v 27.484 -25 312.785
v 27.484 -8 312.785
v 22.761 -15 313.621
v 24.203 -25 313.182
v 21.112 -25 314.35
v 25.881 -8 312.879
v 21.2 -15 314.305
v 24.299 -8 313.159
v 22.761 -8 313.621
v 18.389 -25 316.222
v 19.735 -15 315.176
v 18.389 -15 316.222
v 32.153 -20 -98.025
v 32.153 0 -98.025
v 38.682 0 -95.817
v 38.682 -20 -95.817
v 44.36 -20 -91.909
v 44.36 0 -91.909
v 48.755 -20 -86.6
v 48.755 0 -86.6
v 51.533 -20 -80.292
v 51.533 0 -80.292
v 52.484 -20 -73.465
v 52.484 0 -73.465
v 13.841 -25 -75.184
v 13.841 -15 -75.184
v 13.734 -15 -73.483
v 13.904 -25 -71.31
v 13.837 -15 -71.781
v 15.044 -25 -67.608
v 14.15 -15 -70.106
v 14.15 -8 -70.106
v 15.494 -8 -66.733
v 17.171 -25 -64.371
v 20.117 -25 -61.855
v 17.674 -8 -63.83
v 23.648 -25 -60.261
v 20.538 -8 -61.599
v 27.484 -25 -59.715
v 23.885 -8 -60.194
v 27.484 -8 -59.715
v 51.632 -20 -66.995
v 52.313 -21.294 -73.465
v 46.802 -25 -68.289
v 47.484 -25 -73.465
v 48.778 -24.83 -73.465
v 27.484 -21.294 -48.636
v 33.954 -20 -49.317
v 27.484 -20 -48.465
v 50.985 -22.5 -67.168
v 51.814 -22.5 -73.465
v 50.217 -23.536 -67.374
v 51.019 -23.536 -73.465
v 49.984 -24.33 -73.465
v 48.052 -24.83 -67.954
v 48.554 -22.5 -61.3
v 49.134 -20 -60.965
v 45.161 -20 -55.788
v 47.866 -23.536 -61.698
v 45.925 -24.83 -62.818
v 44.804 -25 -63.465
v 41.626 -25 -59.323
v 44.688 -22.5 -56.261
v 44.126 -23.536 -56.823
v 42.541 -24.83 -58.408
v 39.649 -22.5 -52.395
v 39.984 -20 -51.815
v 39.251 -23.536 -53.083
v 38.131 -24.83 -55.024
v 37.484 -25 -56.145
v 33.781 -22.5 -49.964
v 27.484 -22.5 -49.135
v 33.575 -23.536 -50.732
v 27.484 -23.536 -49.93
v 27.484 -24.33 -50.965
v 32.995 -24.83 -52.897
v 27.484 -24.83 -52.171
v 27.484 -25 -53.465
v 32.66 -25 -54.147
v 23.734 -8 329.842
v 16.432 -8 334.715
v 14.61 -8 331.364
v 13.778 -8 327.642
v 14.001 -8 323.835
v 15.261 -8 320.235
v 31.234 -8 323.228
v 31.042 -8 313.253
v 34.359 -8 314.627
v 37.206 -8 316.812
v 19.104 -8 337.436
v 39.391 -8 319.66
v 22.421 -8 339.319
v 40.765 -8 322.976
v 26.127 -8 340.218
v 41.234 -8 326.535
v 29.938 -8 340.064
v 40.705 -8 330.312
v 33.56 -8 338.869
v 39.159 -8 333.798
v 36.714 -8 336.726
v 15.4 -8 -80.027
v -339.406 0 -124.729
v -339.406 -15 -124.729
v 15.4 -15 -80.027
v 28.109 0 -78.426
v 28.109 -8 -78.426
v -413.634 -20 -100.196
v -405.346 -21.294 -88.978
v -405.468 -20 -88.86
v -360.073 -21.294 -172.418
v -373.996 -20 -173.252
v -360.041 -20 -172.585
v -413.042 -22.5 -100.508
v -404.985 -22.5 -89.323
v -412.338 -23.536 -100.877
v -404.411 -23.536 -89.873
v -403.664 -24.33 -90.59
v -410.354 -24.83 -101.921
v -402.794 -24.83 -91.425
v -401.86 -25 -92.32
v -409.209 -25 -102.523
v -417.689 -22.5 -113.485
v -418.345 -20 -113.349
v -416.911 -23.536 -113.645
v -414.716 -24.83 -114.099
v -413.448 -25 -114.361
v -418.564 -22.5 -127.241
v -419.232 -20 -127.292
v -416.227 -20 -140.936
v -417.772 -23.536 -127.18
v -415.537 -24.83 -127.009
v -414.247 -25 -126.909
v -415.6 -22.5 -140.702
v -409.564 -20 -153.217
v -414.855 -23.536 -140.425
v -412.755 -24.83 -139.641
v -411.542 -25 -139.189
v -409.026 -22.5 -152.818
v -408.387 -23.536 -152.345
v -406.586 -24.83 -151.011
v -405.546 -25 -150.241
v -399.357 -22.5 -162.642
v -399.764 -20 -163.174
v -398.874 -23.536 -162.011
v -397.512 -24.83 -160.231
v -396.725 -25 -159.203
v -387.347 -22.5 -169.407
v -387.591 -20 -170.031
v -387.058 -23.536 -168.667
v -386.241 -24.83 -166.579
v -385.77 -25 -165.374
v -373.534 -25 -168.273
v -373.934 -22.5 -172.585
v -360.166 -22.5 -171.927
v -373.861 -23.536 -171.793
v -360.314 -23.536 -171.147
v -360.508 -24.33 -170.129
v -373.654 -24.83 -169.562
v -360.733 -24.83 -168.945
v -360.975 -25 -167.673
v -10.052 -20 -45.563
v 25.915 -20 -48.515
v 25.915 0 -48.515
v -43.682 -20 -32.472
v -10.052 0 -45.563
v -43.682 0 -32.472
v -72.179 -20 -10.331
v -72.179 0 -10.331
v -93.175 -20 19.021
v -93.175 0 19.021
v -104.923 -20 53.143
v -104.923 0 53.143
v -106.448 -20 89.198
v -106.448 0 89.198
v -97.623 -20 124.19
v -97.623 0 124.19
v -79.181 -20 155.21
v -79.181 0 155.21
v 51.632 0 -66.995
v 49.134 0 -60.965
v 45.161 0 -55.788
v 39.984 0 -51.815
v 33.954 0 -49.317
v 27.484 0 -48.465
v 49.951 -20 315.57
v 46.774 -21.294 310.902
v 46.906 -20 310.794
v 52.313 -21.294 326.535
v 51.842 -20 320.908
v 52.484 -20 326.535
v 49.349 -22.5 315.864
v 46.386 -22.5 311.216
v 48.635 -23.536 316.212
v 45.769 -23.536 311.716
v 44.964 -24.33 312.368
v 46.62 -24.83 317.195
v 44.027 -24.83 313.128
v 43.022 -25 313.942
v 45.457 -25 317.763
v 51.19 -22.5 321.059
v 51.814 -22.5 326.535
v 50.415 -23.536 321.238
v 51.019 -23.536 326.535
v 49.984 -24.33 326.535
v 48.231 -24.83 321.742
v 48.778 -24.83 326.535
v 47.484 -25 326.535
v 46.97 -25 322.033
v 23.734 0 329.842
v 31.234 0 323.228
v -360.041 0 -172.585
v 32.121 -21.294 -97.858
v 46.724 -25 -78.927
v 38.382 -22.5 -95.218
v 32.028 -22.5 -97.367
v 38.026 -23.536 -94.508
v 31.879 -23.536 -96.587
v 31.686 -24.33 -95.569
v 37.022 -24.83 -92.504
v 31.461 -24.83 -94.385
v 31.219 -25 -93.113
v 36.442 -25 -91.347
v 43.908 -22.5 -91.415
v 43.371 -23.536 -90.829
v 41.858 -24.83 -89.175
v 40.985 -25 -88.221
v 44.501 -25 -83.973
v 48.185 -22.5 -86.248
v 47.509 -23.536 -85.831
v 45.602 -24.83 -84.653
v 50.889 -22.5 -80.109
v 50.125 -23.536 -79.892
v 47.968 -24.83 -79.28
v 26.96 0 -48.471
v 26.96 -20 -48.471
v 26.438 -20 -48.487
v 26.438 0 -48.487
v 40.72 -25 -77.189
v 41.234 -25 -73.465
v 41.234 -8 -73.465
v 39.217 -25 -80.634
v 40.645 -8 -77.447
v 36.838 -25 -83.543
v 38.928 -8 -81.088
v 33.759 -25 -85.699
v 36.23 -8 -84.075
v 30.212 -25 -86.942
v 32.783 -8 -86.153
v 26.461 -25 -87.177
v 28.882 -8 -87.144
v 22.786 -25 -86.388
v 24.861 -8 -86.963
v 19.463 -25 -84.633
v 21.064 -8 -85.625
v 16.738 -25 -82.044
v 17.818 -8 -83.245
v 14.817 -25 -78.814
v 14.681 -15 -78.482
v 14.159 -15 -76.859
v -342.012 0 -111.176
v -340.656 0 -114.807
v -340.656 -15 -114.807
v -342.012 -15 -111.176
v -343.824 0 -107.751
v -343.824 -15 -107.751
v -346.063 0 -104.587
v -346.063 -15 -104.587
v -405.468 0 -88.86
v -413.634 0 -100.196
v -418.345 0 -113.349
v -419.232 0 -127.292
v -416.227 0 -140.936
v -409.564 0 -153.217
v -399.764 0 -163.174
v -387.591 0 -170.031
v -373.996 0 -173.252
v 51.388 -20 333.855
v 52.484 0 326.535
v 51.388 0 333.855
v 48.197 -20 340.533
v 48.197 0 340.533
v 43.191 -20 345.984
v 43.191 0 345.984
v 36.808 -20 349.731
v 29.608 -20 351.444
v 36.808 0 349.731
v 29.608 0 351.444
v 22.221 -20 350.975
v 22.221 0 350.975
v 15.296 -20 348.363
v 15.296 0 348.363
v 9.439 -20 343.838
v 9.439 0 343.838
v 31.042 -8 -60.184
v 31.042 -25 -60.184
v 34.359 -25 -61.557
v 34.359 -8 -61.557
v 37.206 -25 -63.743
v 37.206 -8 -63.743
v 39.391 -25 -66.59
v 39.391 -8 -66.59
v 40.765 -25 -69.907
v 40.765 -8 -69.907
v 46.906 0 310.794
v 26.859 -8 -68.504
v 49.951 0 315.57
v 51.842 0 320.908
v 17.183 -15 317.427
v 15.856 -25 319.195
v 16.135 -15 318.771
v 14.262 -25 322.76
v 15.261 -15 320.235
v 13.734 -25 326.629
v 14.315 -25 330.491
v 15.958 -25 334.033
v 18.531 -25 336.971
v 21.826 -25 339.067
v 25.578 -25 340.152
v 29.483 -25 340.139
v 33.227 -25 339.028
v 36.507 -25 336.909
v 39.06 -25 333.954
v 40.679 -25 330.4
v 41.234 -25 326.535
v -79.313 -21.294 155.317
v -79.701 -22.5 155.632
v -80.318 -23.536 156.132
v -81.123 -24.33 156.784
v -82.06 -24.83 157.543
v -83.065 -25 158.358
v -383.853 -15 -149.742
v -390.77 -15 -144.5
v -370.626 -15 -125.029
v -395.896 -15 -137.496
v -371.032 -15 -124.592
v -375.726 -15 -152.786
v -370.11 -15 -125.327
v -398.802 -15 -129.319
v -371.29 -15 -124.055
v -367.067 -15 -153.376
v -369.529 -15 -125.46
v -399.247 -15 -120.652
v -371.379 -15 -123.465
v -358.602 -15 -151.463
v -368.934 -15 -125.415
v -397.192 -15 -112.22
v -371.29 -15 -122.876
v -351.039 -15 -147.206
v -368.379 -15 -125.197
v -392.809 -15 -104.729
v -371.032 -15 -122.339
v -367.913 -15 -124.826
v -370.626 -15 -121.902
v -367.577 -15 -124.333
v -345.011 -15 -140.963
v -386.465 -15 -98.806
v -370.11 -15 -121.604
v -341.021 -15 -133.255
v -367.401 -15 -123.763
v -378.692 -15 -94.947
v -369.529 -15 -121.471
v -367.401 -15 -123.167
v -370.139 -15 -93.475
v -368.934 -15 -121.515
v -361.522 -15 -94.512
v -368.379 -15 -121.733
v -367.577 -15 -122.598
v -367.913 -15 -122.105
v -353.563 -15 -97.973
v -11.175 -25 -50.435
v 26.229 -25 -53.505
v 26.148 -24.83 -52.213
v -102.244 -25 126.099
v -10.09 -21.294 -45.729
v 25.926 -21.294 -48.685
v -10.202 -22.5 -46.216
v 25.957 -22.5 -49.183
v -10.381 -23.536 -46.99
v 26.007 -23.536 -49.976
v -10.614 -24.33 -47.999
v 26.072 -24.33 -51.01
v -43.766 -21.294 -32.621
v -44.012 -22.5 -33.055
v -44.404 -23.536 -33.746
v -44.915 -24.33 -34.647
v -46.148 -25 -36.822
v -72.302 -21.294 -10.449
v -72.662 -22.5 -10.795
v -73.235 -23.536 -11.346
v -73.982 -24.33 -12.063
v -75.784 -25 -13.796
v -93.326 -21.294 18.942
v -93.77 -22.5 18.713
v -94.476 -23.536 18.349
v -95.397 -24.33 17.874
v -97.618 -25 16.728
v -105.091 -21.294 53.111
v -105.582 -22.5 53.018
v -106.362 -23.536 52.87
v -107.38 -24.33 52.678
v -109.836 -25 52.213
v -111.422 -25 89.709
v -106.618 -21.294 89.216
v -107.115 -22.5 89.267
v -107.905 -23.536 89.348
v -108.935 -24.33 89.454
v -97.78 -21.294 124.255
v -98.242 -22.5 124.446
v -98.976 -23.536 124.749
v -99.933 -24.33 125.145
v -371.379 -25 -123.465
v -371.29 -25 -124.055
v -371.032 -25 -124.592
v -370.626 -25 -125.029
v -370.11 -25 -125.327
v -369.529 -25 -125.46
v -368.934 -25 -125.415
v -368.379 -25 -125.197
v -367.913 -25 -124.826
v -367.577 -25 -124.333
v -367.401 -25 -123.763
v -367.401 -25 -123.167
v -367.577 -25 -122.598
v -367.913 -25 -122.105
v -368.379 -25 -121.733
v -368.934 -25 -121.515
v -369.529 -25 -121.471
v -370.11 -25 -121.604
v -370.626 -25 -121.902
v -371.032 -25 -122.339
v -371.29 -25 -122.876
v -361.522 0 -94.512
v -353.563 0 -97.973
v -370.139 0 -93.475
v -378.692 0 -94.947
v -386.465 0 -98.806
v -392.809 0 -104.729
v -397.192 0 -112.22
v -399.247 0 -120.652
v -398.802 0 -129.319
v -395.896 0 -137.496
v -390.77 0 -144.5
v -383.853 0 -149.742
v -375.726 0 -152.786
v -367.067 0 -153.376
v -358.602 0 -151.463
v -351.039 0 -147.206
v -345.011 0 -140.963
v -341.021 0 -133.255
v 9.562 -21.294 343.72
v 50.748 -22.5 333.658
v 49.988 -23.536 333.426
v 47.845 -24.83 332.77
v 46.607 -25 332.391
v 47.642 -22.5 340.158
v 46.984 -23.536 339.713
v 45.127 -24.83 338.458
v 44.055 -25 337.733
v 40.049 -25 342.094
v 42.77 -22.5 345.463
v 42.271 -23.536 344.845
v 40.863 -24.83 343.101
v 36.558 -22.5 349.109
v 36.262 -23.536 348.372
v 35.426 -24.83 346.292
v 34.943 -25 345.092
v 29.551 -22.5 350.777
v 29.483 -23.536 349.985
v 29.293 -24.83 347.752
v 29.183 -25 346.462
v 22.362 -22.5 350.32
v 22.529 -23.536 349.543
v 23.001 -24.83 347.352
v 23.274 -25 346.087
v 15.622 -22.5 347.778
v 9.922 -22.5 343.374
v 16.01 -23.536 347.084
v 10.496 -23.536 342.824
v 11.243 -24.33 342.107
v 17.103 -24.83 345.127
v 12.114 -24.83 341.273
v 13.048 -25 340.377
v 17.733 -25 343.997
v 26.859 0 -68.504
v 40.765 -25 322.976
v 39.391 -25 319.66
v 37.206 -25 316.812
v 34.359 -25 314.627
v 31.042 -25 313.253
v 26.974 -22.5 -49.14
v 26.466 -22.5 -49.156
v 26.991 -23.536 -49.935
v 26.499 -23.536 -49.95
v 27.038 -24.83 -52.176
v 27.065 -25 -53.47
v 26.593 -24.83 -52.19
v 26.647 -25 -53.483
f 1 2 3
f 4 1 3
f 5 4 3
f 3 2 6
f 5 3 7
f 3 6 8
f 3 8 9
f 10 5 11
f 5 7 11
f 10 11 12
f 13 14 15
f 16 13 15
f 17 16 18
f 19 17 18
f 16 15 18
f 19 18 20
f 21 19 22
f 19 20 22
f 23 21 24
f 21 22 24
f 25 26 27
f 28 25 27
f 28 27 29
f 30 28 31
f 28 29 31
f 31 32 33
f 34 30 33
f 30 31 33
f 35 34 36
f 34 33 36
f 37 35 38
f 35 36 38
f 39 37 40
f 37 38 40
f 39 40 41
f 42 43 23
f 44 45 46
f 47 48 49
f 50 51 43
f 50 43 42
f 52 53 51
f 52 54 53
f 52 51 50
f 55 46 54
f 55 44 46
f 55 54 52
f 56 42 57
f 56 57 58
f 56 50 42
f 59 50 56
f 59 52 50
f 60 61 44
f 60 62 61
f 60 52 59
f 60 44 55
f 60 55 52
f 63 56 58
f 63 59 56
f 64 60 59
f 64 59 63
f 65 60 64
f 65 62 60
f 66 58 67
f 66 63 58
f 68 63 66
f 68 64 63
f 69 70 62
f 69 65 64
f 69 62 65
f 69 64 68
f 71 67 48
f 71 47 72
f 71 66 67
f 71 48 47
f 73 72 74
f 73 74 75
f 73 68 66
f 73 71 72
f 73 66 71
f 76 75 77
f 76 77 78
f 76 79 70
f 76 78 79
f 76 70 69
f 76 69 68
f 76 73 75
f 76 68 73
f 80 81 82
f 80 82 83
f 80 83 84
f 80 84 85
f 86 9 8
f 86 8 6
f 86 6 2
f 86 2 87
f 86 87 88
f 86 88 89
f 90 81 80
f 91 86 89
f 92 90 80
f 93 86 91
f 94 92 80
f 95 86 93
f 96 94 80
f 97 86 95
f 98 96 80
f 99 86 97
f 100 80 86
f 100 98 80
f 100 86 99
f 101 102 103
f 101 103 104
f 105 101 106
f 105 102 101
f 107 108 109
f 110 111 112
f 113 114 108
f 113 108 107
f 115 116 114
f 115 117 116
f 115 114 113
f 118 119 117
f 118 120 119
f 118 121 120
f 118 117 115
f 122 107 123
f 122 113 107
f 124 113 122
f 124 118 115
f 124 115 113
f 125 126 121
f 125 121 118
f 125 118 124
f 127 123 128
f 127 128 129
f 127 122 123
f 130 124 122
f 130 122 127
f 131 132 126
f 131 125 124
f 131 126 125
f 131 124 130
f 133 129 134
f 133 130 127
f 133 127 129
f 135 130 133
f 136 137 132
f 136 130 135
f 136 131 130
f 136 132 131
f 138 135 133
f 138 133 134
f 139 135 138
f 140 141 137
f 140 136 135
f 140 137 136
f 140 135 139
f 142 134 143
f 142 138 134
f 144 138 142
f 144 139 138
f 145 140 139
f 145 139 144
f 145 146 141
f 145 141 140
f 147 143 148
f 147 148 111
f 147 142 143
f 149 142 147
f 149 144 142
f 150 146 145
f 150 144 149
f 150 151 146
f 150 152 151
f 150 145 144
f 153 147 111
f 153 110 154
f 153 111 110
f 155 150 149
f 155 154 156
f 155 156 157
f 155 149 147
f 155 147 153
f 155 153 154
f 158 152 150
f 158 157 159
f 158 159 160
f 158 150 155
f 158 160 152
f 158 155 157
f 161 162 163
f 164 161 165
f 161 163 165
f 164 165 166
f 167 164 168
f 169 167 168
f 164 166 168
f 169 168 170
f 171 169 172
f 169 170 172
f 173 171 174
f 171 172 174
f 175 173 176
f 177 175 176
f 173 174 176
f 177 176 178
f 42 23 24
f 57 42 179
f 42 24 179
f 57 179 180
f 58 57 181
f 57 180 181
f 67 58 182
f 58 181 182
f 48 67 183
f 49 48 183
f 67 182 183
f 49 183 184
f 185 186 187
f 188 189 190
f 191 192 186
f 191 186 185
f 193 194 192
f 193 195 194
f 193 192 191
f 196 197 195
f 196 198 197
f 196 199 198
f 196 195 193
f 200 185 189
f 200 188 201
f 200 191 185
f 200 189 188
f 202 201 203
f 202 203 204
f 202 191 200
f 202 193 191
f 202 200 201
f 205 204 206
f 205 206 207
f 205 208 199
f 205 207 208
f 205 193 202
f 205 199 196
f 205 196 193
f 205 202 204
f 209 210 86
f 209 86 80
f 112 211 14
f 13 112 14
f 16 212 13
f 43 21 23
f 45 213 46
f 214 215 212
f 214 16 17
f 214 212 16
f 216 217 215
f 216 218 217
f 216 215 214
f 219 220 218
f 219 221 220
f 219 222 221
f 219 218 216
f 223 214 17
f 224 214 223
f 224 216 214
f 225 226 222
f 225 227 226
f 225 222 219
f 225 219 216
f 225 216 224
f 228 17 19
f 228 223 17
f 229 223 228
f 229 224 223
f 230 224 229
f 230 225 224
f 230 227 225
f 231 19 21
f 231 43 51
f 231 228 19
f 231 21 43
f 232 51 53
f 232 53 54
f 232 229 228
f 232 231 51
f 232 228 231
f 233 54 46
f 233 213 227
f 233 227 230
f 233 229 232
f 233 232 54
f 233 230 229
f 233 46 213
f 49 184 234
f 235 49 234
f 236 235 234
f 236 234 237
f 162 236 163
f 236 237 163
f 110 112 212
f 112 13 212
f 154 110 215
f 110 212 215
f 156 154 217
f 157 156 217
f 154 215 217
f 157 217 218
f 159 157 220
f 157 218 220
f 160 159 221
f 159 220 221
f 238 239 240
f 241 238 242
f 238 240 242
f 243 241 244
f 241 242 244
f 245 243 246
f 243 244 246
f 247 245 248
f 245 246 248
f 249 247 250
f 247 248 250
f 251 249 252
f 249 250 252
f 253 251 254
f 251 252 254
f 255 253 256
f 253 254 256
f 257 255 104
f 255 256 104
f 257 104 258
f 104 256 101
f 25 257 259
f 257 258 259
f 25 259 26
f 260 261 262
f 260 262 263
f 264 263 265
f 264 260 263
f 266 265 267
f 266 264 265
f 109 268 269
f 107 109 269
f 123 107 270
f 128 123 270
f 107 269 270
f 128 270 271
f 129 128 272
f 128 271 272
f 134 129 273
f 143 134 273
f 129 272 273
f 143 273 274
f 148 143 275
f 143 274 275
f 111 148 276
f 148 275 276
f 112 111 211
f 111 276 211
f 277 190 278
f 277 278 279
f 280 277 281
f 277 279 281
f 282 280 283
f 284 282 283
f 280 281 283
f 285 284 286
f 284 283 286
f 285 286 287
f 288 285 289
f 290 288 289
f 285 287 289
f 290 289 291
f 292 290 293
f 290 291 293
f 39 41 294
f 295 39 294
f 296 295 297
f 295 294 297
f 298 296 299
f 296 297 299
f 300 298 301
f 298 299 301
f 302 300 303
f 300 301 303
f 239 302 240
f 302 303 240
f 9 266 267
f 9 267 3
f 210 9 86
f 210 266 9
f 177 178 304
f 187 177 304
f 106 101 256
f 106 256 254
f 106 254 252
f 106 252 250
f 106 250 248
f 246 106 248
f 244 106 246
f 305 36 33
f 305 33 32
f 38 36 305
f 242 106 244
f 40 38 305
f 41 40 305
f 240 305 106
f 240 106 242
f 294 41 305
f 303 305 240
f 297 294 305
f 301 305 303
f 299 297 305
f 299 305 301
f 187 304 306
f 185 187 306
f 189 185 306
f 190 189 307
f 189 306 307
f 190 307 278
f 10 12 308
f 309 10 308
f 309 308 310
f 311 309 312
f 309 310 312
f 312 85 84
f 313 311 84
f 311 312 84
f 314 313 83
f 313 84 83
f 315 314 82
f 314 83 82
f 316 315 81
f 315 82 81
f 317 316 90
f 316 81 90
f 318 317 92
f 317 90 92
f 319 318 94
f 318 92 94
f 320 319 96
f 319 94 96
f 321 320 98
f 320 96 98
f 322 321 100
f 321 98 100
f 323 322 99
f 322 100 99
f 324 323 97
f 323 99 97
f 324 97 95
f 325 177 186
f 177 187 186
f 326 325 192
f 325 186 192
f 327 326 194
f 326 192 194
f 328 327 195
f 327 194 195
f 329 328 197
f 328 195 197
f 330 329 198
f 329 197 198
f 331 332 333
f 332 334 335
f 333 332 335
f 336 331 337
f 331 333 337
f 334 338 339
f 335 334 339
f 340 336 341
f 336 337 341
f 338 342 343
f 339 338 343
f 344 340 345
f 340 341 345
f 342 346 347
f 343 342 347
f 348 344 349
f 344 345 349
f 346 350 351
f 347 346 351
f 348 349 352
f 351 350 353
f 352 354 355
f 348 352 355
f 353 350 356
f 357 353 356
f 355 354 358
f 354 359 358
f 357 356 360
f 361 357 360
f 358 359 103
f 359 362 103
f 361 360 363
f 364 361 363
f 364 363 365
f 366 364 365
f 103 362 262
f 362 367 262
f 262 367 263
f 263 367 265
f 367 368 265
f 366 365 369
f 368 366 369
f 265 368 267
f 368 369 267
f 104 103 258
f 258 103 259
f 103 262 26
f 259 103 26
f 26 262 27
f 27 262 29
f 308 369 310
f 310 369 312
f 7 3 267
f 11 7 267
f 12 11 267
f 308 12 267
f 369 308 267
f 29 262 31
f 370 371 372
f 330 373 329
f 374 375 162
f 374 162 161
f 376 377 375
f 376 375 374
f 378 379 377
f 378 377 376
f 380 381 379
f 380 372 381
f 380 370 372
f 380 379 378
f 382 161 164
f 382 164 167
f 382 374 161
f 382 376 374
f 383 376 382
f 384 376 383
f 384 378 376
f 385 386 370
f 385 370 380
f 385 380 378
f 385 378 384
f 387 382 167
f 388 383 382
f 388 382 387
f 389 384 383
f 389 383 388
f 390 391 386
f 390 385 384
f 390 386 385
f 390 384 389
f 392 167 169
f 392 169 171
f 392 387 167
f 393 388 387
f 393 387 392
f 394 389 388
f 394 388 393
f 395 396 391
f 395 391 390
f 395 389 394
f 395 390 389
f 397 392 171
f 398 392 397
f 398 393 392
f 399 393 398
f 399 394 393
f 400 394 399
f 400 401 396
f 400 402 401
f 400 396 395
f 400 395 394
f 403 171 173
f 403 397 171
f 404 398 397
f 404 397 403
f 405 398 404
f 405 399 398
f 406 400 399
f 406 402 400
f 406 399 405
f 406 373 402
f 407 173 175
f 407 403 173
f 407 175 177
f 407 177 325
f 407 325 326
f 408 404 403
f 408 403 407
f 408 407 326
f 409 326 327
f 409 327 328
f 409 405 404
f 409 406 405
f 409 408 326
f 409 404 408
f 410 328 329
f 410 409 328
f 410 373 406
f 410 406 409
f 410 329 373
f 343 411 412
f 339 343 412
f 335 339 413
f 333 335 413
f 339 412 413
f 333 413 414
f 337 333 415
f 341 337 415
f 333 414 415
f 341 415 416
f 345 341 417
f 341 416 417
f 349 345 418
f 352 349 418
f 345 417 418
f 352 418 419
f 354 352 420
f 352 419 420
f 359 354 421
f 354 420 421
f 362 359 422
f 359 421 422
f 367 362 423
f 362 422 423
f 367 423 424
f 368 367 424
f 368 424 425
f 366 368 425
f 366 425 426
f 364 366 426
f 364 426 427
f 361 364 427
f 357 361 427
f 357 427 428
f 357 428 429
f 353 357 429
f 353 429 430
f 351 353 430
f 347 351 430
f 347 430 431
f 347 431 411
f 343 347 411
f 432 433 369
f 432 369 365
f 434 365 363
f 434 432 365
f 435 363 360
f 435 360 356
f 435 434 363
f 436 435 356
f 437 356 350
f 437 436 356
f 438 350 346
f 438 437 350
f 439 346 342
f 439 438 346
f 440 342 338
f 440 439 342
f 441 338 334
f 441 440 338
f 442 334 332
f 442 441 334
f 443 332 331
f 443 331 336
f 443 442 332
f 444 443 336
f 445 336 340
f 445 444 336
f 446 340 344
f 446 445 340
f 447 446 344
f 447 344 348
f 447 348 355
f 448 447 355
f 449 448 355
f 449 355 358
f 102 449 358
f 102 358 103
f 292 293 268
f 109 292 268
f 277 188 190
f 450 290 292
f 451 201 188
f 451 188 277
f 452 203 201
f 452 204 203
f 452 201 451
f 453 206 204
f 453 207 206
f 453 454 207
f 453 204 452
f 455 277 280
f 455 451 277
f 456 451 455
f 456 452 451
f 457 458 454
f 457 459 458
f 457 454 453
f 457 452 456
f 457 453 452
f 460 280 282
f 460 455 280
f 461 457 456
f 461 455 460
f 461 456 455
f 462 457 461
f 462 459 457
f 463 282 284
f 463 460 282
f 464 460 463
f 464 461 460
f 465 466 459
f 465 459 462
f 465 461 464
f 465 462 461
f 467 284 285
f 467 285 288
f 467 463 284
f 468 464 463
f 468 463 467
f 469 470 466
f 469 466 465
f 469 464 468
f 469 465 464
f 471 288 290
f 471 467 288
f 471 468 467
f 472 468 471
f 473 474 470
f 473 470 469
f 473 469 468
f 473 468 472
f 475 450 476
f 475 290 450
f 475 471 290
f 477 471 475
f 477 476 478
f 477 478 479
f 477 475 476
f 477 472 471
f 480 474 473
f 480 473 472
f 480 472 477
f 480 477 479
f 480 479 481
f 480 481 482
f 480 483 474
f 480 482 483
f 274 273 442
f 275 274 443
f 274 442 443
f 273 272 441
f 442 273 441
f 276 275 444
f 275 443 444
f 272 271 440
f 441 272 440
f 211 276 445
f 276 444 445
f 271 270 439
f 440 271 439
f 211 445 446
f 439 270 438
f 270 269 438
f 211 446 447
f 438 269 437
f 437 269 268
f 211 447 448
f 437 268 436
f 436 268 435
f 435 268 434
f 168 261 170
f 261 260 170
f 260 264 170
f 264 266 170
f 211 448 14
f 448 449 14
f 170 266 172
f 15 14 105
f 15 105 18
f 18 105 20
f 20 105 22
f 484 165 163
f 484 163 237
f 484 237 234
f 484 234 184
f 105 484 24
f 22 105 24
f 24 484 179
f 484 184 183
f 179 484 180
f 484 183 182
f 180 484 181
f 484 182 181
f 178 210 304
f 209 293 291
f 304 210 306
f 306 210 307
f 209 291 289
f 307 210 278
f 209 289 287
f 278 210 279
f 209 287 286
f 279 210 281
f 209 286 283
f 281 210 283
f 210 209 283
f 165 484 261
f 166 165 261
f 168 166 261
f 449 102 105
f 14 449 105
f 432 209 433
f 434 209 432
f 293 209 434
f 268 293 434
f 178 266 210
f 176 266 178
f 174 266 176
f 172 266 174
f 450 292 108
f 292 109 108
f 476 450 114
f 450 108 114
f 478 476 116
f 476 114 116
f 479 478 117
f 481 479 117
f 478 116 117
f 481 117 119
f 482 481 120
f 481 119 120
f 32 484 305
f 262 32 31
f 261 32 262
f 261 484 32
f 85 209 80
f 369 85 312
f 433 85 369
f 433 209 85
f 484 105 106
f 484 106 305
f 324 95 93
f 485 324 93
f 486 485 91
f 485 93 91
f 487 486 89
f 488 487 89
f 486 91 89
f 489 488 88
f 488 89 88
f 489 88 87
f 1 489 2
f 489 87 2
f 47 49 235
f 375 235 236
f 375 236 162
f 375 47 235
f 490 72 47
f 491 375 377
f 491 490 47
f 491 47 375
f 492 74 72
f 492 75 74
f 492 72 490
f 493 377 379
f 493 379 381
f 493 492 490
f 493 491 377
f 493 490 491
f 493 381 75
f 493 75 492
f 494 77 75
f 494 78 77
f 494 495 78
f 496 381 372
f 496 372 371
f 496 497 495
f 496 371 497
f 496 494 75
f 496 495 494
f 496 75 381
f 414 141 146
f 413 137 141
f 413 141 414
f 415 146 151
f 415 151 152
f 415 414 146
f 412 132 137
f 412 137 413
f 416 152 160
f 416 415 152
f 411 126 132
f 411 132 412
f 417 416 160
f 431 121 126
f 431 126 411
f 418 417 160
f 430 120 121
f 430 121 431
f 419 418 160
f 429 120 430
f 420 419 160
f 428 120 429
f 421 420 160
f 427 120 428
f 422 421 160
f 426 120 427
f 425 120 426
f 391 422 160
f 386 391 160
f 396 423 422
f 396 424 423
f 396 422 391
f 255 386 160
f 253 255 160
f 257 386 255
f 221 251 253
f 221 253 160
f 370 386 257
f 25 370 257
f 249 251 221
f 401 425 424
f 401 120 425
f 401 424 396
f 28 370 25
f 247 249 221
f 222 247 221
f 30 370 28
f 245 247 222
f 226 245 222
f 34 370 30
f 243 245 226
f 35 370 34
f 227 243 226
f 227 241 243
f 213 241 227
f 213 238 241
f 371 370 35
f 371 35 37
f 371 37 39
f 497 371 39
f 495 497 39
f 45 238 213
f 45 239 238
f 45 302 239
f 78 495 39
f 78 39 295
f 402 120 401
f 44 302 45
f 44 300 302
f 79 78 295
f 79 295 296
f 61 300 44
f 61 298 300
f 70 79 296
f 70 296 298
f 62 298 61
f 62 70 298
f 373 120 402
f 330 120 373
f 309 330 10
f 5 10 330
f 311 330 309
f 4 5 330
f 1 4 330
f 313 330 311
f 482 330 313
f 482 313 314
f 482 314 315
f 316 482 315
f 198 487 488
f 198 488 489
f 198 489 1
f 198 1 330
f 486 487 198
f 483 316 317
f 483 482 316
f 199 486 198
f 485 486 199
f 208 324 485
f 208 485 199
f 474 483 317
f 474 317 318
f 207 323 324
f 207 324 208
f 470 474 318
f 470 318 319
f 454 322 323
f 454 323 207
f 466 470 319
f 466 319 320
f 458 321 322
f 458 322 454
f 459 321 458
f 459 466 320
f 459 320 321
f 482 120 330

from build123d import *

# Parameters (mm, degrees)
F1_DEPTH = 25
F2_DEPTH = 8
F3_DEPTH = 25
F4_DEPTH = 15
F6_DEPTH = 15
F7_D     = 4
F8_R     = 5


with BuildPart() as f1:
    # F0 (on Front) → F1 (new body)
    with BuildSketch(Plane.XZ):
        with BuildLine():
            Line((-349.5359115523, -100.9652705431), (-336.307154997, -85.9652705431))
            ThreePointArc((-336.307154997, -85.9652705431), (-353.178144257, -76.1627254717), (-372.5163375921, -73.5637935721))
            ThreePointArc((-372.5163375921, -73.5637935721), (-390.430756518, -78.1130324452), (-405.4684846867, -88.8595998648))
            ThreePointArc((-405.4684846867, -88.8595998648), (-413.3268873379, -147.310338704), (-360.0407755432, -172.5854975141))
            ThreePointArc((-360.0407755432, -172.5854975141), (-343.7235260202, -166.3814012494), (-330.5336171349, -154.9459412214))
            ThreePointArc((-330.5336171349, -154.9459412214), (-322.250119692, -140.1645001283), (-319.3790463853, -123.4652705431))
            ThreePointArc((-319.3790463853, -123.4652705431), (-319.4771834235, -120.3341249159), (-319.7712093028, -117.2152705431))
            Line((-319.7712093028, -117.2152705431), (-339.6143441358, -119.7152705431))
            ThreePointArc((-339.6143441358, -119.7152705431), (-339.4379286082, -121.5865831668), (-339.3790463853, -123.4652705431))
            ThreePointArc((-339.3790463853, -123.4652705431), (-396.7221812183, -135.8084053761), (-349.5359115523, -100.9652705431))
        make_face()
        with BuildLine():
            ThreePointArc((-319.7712093028, -117.2152705431), (-325.1848725611, -100.0799118758), (-336.307154997, -85.9652705431))
            Line((-336.307154997, -85.9652705431), (-349.5359115523, -100.9652705431))
            ThreePointArc((-349.5359115523, -100.9652705431), (-342.8625420908, -109.4340553427), (-339.6143441358, -119.7152705431))
            Line((-339.6143441358, -119.7152705431), (-319.7712093028, -117.2152705431))
        make_face()
        with BuildLine():
            Line((-336.307154997, -85.9652705431), (-322.6025679954, -70.4257295315))
            Line((-322.6025679954, -70.4257295315), (-372.5163375921, -73.5637935721))
            ThreePointArc((-372.5163375921, -73.5637935721), (-353.178144257, -76.1627254717), (-336.307154997, -85.9652705431))
        make_face()
        with BuildLine():
            Line((-322.6025679954, -70.4257295315), (10.9477045802, 307.7847294569))
            ThreePointArc((10.9477045802, 307.7847294569), (2.5055132487, 325.4894205434), (9.4389311237, 343.837564796))
            Line((9.4389311237, 343.837564796), (-405.4684846867, -88.8595998648))
            ThreePointArc((-405.4684846867, -88.8595998648), (-390.430756518, -78.1130324452), (-372.5163375921, -73.5637935721))
            Line((-372.5163375921, -73.5637935721), (-322.6025679954, -70.4257295315))
        make_face()
        with BuildLine():
            ThreePointArc((27.4836502744, 301.5347294569), (18.6448155096, 303.1493707896), (10.9477045802, 307.7847294569))
            Line((10.9477045802, 307.7847294569), (-322.6025679954, -70.4257295315))
            Line((-322.6025679954, -70.4257295315), (-258.7862584205, -66.4136168841))
            Line((-258.7862584205, -66.4136168841), (-79.1806184856, 155.209939055))
            Line((-79.1806184856, 155.209939055), (27.4836502744, 286.8278244556))
            Line((27.4836502744, 286.8278244556), (27.4836502744, 301.5347294569))
        make_face()
        with BuildLine():
            Line((-258.7862584205, -66.4136168841), (-322.6025679954, -70.4257295315))
            Line((-322.6025679954, -70.4257295315), (-336.307154997, -85.9652705431))
            ThreePointArc((-336.307154997, -85.9652705431), (-325.1848725611, -100.0799118758), (-319.7712093028, -117.2152705431))
            Line((-319.7712093028, -117.2152705431), (-297.7031676779, -114.4349586354))
            Line((-297.7031676779, -114.4349586354), (-258.7862584205, -66.4136168841))
        make_face()
        with BuildLine():
            Line((-79.1806184856, 155.209939055), (-258.7862584205, -66.4136168841))
            Line((-258.7862584205, -66.4136168841), (25.915004671, -48.5145320576))
            ThreePointArc((25.915004671, -48.5145320576), (-93.174775765, 19.0206064889), (-79.1806184856, 155.209939055))
        make_face()
        with BuildLine():
            Line((13.8414950767, -75.1840205431), (2.6797317332, -76.5902705431))
            ThreePointArc((2.6797317332, -76.5902705431), (12.7792837339, -93.6836187606), (32.1527856955, -98.0253840286))
            ThreePointArc((32.1527856955, -98.0253840286), (46.7414848558, -89.4069080762), (52.4836502744, -73.4652705431))
            ThreePointArc((52.4836502744, -73.4652705431), (45.1613198041, -55.7876010134), (27.4836502744, -48.4652705431))
            Line((27.4836502744, -48.4652705431), (27.4836502744, -59.7152705431))
            ThreePointArc((27.4836502744, -59.7152705431), (37.2063685157, -63.7425523018), (41.2336502744, -73.4652705431))
            ThreePointArc((41.2336502744, -73.4652705431), (28.3447153219, -87.1882828576), (13.8414950767, -75.1840205431))
        make_face()
        with BuildLine():
            Line((2.6797317332, -76.5902705431), (-297.7031676779, -114.4349586354))
            Line((-297.7031676779, -114.4349586354), (-330.5336171349, -154.9459412214))
            ThreePointArc((-330.5336171349, -154.9459412214), (-343.7235260202, -166.3814012494), (-360.0407755432, -172.5854975141))
            Line((-360.0407755432, -172.5854975141), (32.1527856955, -98.0253840286))
            ThreePointArc((32.1527856955, -98.0253840286), (12.7792837339, -93.6836187606), (2.6797317332, -76.5902705431))
        make_face()
        with BuildLine():
            ThreePointArc((27.4836502744, -48.4652705431), (26.6989408177, -48.4775889566), (25.915004671, -48.5145320576))
            ThreePointArc((25.915004671, -48.5145320576), (8.223852566, -57.5260048062), (2.6797317332, -76.5902705431))
            Line((2.6797317332, -76.5902705431), (13.8414950767, -75.1840205431))
            ThreePointArc((13.8414950767, -75.1840205431), (17.1711502744, -64.3705004113), (27.4836502744, -59.7152705431))
            Line((27.4836502744, -59.7152705431), (27.4836502744, -48.4652705431))
        make_face()
        with BuildLine():
            Line((25.915004671, -48.5145320576), (-258.7862584205, -66.4136168841))
            Line((-258.7862584205, -66.4136168841), (-297.7031676779, -114.4349586354))
            Line((-297.7031676779, -114.4349586354), (2.6797317332, -76.5902705431))
            ThreePointArc((2.6797317332, -76.5902705431), (8.223852566, -57.5260048062), (25.915004671, -48.5145320576))
        make_face()
        with BuildLine():
            Line((-297.7031676779, -114.4349586354), (-319.7712093028, -117.2152705431))
            ThreePointArc((-319.7712093028, -117.2152705431), (-319.4771834235, -120.3341249159), (-319.3790463853, -123.4652705431))
            ThreePointArc((-319.3790463853, -123.4652705431), (-322.250119692, -140.1645001283), (-330.5336171349, -154.9459412214))
            Line((-330.5336171349, -154.9459412214), (-297.7031676779, -114.4349586354))
        make_face()
        with BuildLine():
            ThreePointArc((46.9063648996, 310.7943941178), (38.2421728617, 303.9680683893), (27.4836502744, 301.5347294569))
            Line((27.4836502744, 301.5347294569), (27.4836502744, 286.8278244556))
            Line((27.4836502744, 286.8278244556), (46.9063648996, 310.7943941178))
        make_face()
        with BuildLine():
            Line((10.9477045802, 307.7847294569), (18.3888801426, 316.2222294569))
            ThreePointArc((18.3888801426, 316.2222294569), (21.8263801426, 339.0669995887), (41.2336502744, 326.5347294569))
            ThreePointArc((41.2336502744, 326.5347294569), (37.2063685157, 316.8120112156), (27.4836502744, 312.7847294569))
            Line((27.4836502744, 312.7847294569), (27.4836502744, 301.5347294569))
            ThreePointArc((27.4836502744, 301.5347294569), (38.2421728617, 303.9680683893), (46.9063648996, 310.7943941178))
            ThreePointArc((46.9063648996, 310.7943941178), (51.048113621, 318.1851146643), (52.4836502744, 326.5347294569))
            ThreePointArc((52.4836502744, 326.5347294569), (36.8078666284, 349.730828038), (9.4389311237, 343.837564796))
            ThreePointArc((9.4389311237, 343.837564796), (2.5055132487, 325.4894205434), (10.9477045802, 307.7847294569))
        make_face()
        with BuildLine():
            ThreePointArc((27.4836502744, 312.7847294569), (22.6222911537, 313.6727821899), (18.3888801426, 316.2222294569))
            Line((18.3888801426, 316.2222294569), (10.9477045802, 307.7847294569))
            ThreePointArc((10.9477045802, 307.7847294569), (18.6448155096, 303.1493707896), (27.4836502744, 301.5347294569))
            Line((27.4836502744, 301.5347294569), (27.4836502744, 312.7847294569))
        make_face()
    extrude(amount=F1_DEPTH)

    # F0 (on Front) → F2 (join)
    with BuildSketch(Plane.XZ):
        with BuildLine():
            ThreePointArc((27.4836502744, -59.7152705431), (17.1711502744, -64.3705004113), (13.8414950767, -75.1840205431))
            Line((13.8414950767, -75.1840205431), (27.4836502744, -73.4652705431))
            Line((27.4836502744, -73.4652705431), (27.4836502744, -59.7152705431))
        make_face()
        with BuildLine():
            Line((27.4836502744, -73.4652705431), (13.8414950767, -75.1840205431))
            ThreePointArc((13.8414950767, -75.1840205431), (28.3447153219, -87.1882828576), (41.2336502744, -73.4652705431))
            ThreePointArc((41.2336502744, -73.4652705431), (37.2063685157, -63.7425523018), (27.4836502744, -59.7152705431))
            Line((27.4836502744, -59.7152705431), (27.4836502744, -73.4652705431))
        make_face()
        with BuildLine():
            Line((27.4836502744, 312.7847294569), (27.4836502744, 326.5347294569))
            Line((27.4836502744, 326.5347294569), (18.3888801426, 316.2222294569))
            ThreePointArc((18.3888801426, 316.2222294569), (22.6222911537, 313.6727821899), (27.4836502744, 312.7847294569))
        make_face()
        with BuildLine():
            Line((18.3888801426, 316.2222294569), (27.4836502744, 326.5347294569))
            Line((27.4836502744, 326.5347294569), (27.4836502744, 312.7847294569))
            ThreePointArc((27.4836502744, 312.7847294569), (37.2063685157, 316.8120112156), (41.2336502744, 326.5347294569))
            ThreePointArc((41.2336502744, 326.5347294569), (21.8263801426, 339.0669995887), (18.3888801426, 316.2222294569))
        make_face()
    extrude(amount=F2_DEPTH)

    # F0 (on Front) → F3 (join)
    with BuildSketch(Plane.XZ):
        with BuildLine():
            Line((-369.3790463853, -123.4652705431), (-349.5359115523, -100.9652705431))
            ThreePointArc((-349.5359115523, -100.9652705431), (-396.7221812183, -135.8084053761), (-339.3790463853, -123.4652705431))
            ThreePointArc((-339.3790463853, -123.4652705431), (-339.4379286082, -121.5865831668), (-339.6143441358, -119.7152705431))
            Line((-339.6143441358, -119.7152705431), (-369.3790463853, -123.4652705431))
        make_face()
        with BuildLine():
            ThreePointArc((-339.6143441358, -119.7152705431), (-342.8625420908, -109.4340553427), (-349.5359115523, -100.9652705431))
            Line((-349.5359115523, -100.9652705431), (-369.3790463853, -123.4652705431))
            Line((-369.3790463853, -123.4652705431), (-339.6143441358, -119.7152705431))
        make_face()
    extrude(amount=F3_DEPTH)

    # F0 (on Front) → F4 (cut)
    with BuildSketch(Plane.XZ):
        with BuildLine():
            ThreePointArc((-339.6143441358, -119.7152705431), (-342.8625420908, -109.4340553427), (-349.5359115523, -100.9652705431))
            Line((-349.5359115523, -100.9652705431), (-369.3790463853, -123.4652705431))
            Line((-369.3790463853, -123.4652705431), (-339.6143441358, -119.7152705431))
        make_face()
        with BuildLine():
            Line((-369.3790463853, -123.4652705431), (-349.5359115523, -100.9652705431))
            ThreePointArc((-349.5359115523, -100.9652705431), (-396.7221812183, -135.8084053761), (-339.3790463853, -123.4652705431))
            ThreePointArc((-339.3790463853, -123.4652705431), (-339.4379286082, -121.5865831668), (-339.6143441358, -119.7152705431))
            Line((-339.6143441358, -119.7152705431), (-369.3790463853, -123.4652705431))
        make_face()
    extrude(amount=F4_DEPTH, mode=Mode.SUBTRACT)

    # F5 (on Front) → F6 (cut)
    with BuildSketch(Plane.XZ):
        Polygon((-369.3790463853, -123.4652705431), (-368.7540463853, -128.4260542513), (28.1086502744, -78.4260542513), (26.8586502744, -68.5044868349), (-356.8790463853, -116.8508922654), (-365.6290463853, -126.7724596819), align=None)
        Polygon((-373.1290463853, -120.1580814043), (-369.3790463853, -123.4652705431), (-370.0040463853, -118.5044868349), (-356.8790463853, -116.8508922654), (31.2336502744, 323.2275403181), (23.7336502744, 329.8419185957), align=None)
    extrude(amount=F6_DEPTH, mode=Mode.SUBTRACT)

    # F7 (through all)
    with Locations(Plane(origin=(0, 0, 0), x_dir=(1, 0, 0), z_dir=(0, 1, 0))):
        with Locations((-369.3790463853, 123.4652705431)):
            Hole(F7_D / 2)

    # F8
    f8_edges = [f1.edges().sort_by_distance(p)[0] for p in [
        (-198.014777, -25, 127.488982),
    ]]
    fillet(f8_edges, radius=F8_R)


solid = f1.part
